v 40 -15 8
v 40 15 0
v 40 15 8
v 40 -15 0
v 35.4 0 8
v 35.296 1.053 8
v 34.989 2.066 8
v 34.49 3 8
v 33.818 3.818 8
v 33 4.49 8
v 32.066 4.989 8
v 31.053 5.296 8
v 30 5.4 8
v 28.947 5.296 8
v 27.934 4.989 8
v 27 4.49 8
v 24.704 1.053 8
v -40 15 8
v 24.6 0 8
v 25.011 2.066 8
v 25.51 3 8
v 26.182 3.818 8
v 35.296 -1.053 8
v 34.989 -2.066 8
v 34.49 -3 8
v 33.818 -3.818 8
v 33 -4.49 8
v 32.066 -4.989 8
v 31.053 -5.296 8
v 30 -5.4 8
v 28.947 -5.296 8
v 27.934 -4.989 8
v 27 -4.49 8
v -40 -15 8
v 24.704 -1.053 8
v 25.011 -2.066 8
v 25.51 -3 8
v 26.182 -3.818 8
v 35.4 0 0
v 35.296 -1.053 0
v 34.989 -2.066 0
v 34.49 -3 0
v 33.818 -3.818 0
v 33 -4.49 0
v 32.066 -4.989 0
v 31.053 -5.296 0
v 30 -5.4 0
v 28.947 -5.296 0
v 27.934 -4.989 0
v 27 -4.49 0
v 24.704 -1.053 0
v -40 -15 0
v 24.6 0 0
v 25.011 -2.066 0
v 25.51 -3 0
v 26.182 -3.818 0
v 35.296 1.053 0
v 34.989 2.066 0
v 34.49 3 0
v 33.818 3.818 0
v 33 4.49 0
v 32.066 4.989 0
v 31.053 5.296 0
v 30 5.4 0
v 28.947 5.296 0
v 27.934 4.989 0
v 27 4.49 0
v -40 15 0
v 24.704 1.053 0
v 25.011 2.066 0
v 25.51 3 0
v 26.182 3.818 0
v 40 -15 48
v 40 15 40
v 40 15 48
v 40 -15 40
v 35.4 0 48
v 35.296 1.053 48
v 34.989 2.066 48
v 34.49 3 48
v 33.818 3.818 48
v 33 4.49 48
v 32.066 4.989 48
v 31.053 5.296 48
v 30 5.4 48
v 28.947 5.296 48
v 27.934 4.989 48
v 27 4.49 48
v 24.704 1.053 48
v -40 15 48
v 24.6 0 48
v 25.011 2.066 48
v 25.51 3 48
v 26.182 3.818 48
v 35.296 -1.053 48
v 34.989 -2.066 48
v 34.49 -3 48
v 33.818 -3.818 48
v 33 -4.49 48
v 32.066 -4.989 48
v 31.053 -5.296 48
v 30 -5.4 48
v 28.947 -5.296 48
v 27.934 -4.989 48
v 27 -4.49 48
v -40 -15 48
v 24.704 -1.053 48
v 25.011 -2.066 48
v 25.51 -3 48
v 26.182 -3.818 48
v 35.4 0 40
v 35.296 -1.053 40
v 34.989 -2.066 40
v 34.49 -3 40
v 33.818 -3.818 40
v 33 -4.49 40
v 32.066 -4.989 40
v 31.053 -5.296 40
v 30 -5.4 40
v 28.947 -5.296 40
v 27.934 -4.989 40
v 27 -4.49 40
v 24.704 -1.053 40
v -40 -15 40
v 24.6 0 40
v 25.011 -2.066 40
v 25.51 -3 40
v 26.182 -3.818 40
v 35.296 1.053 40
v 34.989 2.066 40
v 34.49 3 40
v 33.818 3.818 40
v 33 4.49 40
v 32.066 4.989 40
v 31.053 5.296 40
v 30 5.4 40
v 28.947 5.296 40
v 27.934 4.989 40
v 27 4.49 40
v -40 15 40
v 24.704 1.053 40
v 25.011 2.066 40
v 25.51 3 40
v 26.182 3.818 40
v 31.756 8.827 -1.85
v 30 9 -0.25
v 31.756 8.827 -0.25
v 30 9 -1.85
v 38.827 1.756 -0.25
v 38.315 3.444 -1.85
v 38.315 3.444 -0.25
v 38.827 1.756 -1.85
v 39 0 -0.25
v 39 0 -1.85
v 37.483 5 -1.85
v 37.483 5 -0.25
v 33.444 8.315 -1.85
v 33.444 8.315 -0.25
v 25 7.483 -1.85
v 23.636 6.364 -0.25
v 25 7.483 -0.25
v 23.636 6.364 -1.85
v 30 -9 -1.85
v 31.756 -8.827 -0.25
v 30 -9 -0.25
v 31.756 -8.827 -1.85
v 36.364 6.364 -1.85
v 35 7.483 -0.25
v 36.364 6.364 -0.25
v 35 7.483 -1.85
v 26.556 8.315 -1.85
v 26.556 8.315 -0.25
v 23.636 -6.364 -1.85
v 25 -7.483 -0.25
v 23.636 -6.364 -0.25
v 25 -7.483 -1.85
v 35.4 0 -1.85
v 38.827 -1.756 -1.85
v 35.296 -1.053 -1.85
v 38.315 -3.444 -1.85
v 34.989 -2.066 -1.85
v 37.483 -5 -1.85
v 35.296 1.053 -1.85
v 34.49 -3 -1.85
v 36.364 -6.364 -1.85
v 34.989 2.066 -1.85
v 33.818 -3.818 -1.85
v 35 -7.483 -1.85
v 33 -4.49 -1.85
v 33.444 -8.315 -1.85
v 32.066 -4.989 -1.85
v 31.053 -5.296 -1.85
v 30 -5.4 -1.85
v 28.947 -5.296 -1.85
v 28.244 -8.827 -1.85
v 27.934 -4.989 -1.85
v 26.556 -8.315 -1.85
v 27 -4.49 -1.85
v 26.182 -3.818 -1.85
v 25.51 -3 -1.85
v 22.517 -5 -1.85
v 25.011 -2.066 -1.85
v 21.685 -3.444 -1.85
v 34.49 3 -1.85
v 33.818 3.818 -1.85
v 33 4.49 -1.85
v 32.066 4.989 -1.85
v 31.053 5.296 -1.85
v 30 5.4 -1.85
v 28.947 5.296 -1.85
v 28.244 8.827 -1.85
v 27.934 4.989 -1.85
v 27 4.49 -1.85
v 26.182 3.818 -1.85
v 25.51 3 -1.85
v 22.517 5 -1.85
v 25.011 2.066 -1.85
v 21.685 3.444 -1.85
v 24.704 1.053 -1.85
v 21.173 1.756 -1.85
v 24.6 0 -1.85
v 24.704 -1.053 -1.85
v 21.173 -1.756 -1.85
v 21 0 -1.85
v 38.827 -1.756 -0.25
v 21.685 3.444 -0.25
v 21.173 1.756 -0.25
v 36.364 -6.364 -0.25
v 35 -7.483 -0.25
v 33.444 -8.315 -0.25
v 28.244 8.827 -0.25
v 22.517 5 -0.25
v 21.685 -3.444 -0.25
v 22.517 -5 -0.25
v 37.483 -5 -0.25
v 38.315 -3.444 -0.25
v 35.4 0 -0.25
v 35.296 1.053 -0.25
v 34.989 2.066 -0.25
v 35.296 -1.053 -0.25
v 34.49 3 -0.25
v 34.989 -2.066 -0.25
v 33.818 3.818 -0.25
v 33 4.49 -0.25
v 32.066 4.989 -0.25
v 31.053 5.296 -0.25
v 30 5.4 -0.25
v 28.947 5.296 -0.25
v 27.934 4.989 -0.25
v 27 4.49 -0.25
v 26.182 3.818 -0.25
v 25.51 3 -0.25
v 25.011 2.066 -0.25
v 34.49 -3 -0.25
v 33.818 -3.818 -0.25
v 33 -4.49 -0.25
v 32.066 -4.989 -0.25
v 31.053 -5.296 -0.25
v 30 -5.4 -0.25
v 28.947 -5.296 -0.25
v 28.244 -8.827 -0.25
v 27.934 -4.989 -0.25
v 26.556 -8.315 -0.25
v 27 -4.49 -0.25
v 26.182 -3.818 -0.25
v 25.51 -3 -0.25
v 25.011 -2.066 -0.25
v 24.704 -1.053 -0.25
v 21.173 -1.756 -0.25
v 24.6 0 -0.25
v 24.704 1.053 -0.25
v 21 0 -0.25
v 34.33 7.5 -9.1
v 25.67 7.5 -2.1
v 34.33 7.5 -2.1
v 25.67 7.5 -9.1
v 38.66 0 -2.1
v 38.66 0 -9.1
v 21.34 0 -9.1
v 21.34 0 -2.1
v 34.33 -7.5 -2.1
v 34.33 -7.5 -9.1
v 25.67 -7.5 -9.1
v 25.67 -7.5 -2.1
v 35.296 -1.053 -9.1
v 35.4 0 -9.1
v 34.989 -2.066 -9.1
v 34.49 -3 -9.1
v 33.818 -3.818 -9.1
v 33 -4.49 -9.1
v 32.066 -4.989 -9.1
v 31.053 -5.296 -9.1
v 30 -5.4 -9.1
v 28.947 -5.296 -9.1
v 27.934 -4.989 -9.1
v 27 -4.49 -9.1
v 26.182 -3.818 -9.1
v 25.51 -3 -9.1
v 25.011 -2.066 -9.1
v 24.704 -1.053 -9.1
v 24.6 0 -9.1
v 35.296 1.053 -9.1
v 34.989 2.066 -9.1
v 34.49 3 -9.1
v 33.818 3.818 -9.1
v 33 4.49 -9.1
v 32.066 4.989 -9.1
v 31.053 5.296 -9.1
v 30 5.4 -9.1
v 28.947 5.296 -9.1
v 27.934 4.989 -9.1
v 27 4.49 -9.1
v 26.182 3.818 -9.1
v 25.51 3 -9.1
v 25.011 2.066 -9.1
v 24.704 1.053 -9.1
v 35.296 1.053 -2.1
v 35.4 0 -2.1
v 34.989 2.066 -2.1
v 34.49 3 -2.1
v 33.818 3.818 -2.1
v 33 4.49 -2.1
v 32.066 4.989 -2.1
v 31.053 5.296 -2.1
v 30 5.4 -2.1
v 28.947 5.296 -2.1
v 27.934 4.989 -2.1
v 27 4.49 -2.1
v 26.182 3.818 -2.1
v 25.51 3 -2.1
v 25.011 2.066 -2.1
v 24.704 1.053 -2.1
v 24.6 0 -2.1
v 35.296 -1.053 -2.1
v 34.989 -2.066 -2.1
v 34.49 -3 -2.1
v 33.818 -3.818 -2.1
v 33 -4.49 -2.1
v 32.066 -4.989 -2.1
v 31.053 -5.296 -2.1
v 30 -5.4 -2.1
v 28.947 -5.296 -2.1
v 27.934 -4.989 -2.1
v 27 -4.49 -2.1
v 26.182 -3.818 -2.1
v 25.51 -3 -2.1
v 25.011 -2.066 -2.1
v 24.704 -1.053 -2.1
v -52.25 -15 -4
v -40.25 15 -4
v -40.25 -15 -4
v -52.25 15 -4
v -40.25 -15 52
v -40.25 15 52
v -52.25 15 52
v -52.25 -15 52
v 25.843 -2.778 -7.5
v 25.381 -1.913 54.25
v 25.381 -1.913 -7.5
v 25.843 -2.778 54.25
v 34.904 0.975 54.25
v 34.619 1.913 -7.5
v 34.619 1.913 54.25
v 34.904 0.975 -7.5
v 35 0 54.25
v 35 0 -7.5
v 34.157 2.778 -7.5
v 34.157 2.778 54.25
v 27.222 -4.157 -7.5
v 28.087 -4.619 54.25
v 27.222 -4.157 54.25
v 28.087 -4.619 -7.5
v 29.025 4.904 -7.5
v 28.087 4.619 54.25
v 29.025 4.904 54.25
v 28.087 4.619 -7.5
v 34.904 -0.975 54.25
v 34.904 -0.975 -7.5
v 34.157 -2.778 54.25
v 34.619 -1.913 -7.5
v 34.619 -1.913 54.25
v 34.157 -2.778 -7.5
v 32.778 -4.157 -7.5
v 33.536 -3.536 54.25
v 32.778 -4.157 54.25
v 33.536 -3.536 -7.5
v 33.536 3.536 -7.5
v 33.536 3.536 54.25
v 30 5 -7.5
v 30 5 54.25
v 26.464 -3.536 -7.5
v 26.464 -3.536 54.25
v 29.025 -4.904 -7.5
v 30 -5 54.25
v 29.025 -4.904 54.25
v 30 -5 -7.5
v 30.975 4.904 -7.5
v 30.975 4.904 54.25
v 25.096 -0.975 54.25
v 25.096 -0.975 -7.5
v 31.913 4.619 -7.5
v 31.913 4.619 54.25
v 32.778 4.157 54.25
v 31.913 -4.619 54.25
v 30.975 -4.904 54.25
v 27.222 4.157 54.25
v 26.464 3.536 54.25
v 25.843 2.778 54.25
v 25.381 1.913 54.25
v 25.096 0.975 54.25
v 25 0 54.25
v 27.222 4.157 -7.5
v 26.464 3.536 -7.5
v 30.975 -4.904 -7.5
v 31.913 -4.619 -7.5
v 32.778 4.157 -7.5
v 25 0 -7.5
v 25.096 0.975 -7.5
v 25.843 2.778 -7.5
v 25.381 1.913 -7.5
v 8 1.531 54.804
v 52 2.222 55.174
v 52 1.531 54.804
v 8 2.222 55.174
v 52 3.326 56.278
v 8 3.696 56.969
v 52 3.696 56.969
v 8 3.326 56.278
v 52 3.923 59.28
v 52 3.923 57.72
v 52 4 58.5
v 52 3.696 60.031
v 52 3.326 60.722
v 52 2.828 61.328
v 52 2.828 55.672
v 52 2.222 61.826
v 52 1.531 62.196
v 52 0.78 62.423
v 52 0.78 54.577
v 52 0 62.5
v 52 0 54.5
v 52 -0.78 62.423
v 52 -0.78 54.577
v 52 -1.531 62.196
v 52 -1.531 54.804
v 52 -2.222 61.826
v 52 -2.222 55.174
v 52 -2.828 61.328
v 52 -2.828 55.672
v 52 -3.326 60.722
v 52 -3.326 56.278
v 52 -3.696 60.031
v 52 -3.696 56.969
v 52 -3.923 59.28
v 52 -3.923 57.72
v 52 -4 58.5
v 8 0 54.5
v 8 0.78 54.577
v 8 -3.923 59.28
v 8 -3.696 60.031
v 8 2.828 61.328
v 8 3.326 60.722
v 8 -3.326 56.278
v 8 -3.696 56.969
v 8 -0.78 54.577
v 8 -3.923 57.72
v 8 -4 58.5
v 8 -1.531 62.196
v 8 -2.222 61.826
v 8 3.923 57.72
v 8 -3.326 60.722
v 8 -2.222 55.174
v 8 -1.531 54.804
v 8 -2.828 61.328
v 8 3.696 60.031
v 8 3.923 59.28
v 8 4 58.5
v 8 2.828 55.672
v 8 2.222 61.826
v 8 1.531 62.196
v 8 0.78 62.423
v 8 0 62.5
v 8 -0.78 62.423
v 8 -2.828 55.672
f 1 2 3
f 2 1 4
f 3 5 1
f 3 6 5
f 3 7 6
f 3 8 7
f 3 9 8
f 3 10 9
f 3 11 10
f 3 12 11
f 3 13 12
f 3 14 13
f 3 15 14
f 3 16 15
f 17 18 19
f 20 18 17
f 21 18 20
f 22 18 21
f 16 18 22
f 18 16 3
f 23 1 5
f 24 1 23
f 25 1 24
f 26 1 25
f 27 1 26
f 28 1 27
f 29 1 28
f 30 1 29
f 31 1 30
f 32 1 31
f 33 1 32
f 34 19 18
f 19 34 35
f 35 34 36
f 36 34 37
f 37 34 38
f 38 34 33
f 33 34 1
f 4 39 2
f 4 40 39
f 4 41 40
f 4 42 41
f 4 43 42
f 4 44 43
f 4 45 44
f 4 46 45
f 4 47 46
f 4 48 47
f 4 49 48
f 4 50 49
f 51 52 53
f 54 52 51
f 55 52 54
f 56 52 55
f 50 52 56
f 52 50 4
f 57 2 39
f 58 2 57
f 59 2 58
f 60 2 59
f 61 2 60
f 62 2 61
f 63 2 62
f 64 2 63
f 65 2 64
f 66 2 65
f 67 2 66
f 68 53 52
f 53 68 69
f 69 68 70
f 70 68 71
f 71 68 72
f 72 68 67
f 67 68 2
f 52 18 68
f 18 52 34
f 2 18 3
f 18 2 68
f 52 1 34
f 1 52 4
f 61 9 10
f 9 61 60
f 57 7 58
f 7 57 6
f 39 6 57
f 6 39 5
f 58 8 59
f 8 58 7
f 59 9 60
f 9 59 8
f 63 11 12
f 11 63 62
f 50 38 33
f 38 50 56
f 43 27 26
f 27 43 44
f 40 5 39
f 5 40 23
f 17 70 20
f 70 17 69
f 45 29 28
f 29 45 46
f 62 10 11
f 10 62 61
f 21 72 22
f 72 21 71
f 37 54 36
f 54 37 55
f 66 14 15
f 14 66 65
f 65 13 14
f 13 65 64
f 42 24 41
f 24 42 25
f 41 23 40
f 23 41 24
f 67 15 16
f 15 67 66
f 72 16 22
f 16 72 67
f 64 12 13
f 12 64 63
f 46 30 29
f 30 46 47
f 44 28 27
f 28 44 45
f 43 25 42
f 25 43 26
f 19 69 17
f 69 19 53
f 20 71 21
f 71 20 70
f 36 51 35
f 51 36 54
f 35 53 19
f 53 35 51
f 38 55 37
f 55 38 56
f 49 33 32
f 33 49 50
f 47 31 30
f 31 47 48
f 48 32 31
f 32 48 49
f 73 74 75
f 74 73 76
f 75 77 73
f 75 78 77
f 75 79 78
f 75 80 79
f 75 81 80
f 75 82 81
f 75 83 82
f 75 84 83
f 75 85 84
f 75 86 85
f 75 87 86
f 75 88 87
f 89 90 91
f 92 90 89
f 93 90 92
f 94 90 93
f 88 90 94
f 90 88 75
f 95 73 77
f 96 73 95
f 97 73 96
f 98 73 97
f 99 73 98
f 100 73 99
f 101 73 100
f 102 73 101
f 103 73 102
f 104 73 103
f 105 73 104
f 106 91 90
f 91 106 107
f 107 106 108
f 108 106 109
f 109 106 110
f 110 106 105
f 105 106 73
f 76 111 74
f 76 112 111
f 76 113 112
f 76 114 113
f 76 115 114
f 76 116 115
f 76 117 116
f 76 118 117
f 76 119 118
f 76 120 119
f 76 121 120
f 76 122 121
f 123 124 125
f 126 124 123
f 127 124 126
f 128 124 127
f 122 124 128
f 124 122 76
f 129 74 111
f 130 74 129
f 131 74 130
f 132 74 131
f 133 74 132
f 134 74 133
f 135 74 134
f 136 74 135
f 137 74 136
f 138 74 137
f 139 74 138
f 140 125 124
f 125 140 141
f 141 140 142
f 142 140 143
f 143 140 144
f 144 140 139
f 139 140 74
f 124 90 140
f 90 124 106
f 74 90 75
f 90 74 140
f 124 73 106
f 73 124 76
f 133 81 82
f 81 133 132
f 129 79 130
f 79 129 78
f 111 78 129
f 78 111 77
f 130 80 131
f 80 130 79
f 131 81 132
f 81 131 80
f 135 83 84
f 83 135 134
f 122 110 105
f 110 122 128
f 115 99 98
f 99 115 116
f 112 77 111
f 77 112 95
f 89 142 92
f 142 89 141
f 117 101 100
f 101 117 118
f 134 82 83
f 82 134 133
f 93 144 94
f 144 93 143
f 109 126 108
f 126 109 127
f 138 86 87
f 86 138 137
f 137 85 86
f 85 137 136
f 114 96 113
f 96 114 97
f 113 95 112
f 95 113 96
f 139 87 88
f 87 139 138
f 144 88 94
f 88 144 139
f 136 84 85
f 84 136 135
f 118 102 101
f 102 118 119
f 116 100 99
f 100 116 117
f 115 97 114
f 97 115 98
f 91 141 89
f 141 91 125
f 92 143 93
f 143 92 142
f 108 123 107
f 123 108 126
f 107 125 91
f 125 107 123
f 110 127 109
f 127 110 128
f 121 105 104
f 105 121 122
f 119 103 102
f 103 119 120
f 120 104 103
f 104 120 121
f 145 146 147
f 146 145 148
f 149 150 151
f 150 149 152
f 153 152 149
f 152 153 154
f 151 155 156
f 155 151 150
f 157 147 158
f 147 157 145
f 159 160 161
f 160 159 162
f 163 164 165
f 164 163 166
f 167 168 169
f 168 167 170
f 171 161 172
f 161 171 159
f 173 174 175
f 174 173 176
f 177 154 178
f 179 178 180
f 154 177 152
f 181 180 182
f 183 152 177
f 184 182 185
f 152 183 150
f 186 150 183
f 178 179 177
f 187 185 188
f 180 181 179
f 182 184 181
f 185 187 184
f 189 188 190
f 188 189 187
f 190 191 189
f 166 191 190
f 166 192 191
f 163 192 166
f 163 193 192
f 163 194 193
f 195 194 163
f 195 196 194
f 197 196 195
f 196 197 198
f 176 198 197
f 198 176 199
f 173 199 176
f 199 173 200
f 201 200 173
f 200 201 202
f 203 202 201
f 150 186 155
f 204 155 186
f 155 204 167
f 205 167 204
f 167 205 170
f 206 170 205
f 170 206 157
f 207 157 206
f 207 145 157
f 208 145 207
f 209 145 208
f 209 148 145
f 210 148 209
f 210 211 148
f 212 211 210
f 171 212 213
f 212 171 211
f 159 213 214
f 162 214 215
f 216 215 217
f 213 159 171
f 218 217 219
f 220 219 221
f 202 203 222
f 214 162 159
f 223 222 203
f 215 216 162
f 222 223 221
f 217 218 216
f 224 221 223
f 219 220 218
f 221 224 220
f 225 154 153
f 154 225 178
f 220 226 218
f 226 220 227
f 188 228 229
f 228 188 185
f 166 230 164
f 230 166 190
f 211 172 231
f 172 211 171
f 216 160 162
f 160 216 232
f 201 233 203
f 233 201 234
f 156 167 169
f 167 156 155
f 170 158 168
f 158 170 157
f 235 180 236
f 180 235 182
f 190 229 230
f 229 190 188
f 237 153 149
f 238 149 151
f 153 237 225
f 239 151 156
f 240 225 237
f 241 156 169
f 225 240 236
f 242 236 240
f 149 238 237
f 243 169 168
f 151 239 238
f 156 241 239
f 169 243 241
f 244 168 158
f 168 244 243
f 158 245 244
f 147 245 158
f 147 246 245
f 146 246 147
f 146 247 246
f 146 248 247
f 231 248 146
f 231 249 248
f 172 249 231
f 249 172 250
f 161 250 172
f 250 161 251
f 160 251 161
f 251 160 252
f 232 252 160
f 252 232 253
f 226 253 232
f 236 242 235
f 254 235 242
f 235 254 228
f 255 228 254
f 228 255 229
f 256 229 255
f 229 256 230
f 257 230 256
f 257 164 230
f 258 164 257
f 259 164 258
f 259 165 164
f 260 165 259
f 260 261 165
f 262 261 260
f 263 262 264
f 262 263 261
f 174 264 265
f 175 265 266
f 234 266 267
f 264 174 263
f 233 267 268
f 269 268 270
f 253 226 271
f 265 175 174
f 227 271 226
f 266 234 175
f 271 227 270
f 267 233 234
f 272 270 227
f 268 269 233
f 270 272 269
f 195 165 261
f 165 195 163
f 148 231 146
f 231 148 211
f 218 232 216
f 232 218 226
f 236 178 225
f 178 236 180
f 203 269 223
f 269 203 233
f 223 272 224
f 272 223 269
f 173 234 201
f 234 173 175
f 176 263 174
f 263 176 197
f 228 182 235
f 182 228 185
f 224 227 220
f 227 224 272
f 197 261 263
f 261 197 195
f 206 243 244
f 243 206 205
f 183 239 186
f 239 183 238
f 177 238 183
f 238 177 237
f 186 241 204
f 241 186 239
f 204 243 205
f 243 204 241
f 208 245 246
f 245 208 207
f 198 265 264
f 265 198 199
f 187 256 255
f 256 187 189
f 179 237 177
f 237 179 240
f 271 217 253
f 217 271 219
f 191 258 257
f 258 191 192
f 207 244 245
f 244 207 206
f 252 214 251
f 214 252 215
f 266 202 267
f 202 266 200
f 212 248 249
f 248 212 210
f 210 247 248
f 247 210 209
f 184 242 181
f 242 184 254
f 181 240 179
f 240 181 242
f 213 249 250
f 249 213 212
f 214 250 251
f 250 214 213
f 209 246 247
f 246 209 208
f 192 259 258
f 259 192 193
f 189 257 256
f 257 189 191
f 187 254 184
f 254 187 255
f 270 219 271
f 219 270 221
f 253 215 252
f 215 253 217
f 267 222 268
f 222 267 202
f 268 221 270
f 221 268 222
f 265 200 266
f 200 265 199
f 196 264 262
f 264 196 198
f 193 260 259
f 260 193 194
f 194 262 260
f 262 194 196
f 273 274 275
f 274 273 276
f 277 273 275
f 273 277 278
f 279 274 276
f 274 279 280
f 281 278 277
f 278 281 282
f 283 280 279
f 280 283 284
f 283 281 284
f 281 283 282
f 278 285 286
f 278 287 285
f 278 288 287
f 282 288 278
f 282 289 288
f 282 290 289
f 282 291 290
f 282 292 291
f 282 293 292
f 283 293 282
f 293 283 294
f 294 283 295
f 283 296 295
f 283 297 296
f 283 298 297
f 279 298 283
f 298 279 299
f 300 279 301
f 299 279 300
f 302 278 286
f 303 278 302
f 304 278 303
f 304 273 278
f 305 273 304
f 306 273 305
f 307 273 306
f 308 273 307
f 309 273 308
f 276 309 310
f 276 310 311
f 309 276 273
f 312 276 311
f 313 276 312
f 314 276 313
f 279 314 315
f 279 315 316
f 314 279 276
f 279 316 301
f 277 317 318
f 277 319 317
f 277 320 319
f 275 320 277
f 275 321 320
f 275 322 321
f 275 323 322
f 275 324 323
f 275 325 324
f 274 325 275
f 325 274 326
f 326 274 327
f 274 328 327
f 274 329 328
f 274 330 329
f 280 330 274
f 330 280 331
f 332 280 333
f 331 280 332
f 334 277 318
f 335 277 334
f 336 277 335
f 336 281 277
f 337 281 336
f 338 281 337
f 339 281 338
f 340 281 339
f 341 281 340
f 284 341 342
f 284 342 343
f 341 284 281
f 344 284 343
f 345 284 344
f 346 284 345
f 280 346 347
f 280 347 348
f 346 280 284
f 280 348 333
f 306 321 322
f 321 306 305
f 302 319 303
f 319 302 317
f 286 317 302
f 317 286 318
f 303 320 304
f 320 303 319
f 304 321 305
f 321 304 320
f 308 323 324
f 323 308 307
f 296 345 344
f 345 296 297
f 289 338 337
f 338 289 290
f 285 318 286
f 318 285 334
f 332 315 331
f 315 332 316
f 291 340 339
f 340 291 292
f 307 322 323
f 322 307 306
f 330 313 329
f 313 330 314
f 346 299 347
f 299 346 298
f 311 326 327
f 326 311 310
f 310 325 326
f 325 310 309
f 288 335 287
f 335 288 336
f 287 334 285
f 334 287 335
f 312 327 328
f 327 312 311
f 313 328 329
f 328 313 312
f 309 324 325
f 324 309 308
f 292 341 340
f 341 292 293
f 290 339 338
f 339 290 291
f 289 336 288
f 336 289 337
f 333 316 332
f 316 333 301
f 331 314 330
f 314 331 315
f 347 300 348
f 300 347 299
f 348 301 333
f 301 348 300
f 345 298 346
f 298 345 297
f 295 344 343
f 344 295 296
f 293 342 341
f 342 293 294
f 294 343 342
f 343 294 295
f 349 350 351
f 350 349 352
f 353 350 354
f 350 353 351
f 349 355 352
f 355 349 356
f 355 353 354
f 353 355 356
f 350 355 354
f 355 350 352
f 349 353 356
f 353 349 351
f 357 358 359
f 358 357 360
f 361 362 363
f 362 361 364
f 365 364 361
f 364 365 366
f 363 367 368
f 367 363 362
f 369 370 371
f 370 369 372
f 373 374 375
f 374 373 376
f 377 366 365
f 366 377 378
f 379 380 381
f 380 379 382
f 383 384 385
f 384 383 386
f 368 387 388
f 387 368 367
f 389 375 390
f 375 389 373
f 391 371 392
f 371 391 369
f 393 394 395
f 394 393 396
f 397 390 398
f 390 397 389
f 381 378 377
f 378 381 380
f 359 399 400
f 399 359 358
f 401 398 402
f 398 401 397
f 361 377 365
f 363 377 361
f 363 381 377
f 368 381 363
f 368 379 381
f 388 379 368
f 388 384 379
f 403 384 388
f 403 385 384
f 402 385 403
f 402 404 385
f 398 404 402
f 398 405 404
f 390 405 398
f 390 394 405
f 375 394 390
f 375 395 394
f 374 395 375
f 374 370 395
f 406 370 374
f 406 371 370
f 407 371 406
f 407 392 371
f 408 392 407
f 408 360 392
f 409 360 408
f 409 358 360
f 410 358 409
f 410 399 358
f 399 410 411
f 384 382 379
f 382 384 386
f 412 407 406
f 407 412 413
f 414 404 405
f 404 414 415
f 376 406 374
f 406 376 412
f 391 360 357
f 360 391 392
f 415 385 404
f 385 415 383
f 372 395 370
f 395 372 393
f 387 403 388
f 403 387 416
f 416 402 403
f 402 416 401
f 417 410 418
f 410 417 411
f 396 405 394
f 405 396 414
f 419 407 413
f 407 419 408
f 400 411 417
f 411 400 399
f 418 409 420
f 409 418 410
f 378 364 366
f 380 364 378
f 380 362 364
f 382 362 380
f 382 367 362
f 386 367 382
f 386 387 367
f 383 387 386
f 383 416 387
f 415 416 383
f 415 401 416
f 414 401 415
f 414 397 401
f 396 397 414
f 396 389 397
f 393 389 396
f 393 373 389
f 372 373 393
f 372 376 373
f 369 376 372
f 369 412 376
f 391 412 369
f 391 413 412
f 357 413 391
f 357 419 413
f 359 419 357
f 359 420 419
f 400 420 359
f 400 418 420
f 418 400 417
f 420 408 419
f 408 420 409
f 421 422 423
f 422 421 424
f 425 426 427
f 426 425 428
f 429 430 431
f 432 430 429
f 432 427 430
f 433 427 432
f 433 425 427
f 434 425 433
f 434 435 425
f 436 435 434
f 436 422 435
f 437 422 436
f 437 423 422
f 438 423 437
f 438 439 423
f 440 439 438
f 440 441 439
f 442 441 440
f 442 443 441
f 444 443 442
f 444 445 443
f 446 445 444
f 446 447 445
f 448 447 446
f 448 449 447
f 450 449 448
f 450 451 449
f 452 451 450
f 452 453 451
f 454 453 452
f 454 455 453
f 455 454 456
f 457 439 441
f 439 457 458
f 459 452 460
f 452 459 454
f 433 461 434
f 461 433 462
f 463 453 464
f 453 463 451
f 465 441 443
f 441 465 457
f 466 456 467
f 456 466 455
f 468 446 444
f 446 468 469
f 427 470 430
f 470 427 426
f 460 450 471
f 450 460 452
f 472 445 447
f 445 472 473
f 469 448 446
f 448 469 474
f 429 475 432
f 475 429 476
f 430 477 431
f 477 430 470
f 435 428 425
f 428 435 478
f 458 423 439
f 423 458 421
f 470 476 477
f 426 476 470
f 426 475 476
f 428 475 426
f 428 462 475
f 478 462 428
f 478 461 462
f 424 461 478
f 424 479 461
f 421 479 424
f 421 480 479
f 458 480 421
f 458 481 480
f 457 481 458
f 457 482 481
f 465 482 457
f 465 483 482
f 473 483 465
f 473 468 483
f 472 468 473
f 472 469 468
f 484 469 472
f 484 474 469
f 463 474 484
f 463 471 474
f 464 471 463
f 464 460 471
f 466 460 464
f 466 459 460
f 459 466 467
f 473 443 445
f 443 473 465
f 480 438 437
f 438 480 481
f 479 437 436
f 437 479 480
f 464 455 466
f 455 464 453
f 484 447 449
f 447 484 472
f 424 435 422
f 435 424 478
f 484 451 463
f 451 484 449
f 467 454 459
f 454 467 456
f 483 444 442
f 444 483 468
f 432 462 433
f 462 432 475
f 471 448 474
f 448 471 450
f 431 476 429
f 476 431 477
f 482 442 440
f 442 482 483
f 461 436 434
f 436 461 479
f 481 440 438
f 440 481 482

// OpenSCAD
$fn = 32;

// ------------------------------------------------------------------------
// C clamp: throat 40 mm, screw d10
// Every part is its own module, assembly() places every instance.
// ------------------------------------------------------------------------

// --- part 1 ---
module clamp_arm() {
  difference() {
    translate([-40, -15, 0]) cube([80, 30, 8]);
    translate([30, 0, -1]) cylinder(h = 10, d = 10.8);
  }
}

// --- part 2 ---
module clamp_spine() {
  difference() {
    translate([-28, -15, 0]) cube([56, 30, 12]);
  }
}

// --- part 3 ---
module clamp_screw() {
  translate([0, 0, -30.875]) cylinder(h = 61.75, d = 10);
}

// --- part 4 ---
module clamp_washer() {
  difference() {
      translate([0, 0, 0]) cylinder(h = 1.6, d = 18);
      translate([0, 0, -1]) cylinder(h = 3.6, d = 10.8);
    }
}

// --- part 5 ---
module clamp_nut() {
  difference() {
    linear_extrude(height = 7) polygon(points = [[8.66, 0], [4.33, 7.5], [-4.33, 7.5], [-8.66, 0], [-4.33, -7.5], [4.33, -7.5]]);
    translate([0, 0, -1]) cylinder(h = 9, d = 10.8);
  }
}

// --- part 6 ---
module tommy_bar() {
  translate([0, 0, -22]) cylinder(h = 44, d = 8);
}

// --- assembly ---
module assembly() {
  color([0.80, 0.24, 0.20]) translate([0, 0, 0]) rotate([0, 0, 0]) clamp_arm();
  color([0.20, 0.45, 0.75]) translate([0, 0, 40]) rotate([0, 0, 0]) clamp_arm();
  color([0.25, 0.62, 0.32]) translate([-52.25, 0, 24]) rotate([0, 90, 0]) clamp_spine();
  color([0.92, 0.70, 0.18]) translate([30, 0, 23.375]) rotate([0, 0, 0]) clamp_screw();
  color([0.58, 0.35, 0.70]) translate([30, 0, -1.85]) rotate([0, 0, 0]) clamp_washer();
  color([0.16, 0.66, 0.66]) translate([30, 0, -9.1]) rotate([0, 0, 0]) clamp_nut();
  color([0.85, 0.48, 0.18]) translate([30, 0, 58.5]) rotate([0, 90, 0]) tommy_bar();
}

assembly();
